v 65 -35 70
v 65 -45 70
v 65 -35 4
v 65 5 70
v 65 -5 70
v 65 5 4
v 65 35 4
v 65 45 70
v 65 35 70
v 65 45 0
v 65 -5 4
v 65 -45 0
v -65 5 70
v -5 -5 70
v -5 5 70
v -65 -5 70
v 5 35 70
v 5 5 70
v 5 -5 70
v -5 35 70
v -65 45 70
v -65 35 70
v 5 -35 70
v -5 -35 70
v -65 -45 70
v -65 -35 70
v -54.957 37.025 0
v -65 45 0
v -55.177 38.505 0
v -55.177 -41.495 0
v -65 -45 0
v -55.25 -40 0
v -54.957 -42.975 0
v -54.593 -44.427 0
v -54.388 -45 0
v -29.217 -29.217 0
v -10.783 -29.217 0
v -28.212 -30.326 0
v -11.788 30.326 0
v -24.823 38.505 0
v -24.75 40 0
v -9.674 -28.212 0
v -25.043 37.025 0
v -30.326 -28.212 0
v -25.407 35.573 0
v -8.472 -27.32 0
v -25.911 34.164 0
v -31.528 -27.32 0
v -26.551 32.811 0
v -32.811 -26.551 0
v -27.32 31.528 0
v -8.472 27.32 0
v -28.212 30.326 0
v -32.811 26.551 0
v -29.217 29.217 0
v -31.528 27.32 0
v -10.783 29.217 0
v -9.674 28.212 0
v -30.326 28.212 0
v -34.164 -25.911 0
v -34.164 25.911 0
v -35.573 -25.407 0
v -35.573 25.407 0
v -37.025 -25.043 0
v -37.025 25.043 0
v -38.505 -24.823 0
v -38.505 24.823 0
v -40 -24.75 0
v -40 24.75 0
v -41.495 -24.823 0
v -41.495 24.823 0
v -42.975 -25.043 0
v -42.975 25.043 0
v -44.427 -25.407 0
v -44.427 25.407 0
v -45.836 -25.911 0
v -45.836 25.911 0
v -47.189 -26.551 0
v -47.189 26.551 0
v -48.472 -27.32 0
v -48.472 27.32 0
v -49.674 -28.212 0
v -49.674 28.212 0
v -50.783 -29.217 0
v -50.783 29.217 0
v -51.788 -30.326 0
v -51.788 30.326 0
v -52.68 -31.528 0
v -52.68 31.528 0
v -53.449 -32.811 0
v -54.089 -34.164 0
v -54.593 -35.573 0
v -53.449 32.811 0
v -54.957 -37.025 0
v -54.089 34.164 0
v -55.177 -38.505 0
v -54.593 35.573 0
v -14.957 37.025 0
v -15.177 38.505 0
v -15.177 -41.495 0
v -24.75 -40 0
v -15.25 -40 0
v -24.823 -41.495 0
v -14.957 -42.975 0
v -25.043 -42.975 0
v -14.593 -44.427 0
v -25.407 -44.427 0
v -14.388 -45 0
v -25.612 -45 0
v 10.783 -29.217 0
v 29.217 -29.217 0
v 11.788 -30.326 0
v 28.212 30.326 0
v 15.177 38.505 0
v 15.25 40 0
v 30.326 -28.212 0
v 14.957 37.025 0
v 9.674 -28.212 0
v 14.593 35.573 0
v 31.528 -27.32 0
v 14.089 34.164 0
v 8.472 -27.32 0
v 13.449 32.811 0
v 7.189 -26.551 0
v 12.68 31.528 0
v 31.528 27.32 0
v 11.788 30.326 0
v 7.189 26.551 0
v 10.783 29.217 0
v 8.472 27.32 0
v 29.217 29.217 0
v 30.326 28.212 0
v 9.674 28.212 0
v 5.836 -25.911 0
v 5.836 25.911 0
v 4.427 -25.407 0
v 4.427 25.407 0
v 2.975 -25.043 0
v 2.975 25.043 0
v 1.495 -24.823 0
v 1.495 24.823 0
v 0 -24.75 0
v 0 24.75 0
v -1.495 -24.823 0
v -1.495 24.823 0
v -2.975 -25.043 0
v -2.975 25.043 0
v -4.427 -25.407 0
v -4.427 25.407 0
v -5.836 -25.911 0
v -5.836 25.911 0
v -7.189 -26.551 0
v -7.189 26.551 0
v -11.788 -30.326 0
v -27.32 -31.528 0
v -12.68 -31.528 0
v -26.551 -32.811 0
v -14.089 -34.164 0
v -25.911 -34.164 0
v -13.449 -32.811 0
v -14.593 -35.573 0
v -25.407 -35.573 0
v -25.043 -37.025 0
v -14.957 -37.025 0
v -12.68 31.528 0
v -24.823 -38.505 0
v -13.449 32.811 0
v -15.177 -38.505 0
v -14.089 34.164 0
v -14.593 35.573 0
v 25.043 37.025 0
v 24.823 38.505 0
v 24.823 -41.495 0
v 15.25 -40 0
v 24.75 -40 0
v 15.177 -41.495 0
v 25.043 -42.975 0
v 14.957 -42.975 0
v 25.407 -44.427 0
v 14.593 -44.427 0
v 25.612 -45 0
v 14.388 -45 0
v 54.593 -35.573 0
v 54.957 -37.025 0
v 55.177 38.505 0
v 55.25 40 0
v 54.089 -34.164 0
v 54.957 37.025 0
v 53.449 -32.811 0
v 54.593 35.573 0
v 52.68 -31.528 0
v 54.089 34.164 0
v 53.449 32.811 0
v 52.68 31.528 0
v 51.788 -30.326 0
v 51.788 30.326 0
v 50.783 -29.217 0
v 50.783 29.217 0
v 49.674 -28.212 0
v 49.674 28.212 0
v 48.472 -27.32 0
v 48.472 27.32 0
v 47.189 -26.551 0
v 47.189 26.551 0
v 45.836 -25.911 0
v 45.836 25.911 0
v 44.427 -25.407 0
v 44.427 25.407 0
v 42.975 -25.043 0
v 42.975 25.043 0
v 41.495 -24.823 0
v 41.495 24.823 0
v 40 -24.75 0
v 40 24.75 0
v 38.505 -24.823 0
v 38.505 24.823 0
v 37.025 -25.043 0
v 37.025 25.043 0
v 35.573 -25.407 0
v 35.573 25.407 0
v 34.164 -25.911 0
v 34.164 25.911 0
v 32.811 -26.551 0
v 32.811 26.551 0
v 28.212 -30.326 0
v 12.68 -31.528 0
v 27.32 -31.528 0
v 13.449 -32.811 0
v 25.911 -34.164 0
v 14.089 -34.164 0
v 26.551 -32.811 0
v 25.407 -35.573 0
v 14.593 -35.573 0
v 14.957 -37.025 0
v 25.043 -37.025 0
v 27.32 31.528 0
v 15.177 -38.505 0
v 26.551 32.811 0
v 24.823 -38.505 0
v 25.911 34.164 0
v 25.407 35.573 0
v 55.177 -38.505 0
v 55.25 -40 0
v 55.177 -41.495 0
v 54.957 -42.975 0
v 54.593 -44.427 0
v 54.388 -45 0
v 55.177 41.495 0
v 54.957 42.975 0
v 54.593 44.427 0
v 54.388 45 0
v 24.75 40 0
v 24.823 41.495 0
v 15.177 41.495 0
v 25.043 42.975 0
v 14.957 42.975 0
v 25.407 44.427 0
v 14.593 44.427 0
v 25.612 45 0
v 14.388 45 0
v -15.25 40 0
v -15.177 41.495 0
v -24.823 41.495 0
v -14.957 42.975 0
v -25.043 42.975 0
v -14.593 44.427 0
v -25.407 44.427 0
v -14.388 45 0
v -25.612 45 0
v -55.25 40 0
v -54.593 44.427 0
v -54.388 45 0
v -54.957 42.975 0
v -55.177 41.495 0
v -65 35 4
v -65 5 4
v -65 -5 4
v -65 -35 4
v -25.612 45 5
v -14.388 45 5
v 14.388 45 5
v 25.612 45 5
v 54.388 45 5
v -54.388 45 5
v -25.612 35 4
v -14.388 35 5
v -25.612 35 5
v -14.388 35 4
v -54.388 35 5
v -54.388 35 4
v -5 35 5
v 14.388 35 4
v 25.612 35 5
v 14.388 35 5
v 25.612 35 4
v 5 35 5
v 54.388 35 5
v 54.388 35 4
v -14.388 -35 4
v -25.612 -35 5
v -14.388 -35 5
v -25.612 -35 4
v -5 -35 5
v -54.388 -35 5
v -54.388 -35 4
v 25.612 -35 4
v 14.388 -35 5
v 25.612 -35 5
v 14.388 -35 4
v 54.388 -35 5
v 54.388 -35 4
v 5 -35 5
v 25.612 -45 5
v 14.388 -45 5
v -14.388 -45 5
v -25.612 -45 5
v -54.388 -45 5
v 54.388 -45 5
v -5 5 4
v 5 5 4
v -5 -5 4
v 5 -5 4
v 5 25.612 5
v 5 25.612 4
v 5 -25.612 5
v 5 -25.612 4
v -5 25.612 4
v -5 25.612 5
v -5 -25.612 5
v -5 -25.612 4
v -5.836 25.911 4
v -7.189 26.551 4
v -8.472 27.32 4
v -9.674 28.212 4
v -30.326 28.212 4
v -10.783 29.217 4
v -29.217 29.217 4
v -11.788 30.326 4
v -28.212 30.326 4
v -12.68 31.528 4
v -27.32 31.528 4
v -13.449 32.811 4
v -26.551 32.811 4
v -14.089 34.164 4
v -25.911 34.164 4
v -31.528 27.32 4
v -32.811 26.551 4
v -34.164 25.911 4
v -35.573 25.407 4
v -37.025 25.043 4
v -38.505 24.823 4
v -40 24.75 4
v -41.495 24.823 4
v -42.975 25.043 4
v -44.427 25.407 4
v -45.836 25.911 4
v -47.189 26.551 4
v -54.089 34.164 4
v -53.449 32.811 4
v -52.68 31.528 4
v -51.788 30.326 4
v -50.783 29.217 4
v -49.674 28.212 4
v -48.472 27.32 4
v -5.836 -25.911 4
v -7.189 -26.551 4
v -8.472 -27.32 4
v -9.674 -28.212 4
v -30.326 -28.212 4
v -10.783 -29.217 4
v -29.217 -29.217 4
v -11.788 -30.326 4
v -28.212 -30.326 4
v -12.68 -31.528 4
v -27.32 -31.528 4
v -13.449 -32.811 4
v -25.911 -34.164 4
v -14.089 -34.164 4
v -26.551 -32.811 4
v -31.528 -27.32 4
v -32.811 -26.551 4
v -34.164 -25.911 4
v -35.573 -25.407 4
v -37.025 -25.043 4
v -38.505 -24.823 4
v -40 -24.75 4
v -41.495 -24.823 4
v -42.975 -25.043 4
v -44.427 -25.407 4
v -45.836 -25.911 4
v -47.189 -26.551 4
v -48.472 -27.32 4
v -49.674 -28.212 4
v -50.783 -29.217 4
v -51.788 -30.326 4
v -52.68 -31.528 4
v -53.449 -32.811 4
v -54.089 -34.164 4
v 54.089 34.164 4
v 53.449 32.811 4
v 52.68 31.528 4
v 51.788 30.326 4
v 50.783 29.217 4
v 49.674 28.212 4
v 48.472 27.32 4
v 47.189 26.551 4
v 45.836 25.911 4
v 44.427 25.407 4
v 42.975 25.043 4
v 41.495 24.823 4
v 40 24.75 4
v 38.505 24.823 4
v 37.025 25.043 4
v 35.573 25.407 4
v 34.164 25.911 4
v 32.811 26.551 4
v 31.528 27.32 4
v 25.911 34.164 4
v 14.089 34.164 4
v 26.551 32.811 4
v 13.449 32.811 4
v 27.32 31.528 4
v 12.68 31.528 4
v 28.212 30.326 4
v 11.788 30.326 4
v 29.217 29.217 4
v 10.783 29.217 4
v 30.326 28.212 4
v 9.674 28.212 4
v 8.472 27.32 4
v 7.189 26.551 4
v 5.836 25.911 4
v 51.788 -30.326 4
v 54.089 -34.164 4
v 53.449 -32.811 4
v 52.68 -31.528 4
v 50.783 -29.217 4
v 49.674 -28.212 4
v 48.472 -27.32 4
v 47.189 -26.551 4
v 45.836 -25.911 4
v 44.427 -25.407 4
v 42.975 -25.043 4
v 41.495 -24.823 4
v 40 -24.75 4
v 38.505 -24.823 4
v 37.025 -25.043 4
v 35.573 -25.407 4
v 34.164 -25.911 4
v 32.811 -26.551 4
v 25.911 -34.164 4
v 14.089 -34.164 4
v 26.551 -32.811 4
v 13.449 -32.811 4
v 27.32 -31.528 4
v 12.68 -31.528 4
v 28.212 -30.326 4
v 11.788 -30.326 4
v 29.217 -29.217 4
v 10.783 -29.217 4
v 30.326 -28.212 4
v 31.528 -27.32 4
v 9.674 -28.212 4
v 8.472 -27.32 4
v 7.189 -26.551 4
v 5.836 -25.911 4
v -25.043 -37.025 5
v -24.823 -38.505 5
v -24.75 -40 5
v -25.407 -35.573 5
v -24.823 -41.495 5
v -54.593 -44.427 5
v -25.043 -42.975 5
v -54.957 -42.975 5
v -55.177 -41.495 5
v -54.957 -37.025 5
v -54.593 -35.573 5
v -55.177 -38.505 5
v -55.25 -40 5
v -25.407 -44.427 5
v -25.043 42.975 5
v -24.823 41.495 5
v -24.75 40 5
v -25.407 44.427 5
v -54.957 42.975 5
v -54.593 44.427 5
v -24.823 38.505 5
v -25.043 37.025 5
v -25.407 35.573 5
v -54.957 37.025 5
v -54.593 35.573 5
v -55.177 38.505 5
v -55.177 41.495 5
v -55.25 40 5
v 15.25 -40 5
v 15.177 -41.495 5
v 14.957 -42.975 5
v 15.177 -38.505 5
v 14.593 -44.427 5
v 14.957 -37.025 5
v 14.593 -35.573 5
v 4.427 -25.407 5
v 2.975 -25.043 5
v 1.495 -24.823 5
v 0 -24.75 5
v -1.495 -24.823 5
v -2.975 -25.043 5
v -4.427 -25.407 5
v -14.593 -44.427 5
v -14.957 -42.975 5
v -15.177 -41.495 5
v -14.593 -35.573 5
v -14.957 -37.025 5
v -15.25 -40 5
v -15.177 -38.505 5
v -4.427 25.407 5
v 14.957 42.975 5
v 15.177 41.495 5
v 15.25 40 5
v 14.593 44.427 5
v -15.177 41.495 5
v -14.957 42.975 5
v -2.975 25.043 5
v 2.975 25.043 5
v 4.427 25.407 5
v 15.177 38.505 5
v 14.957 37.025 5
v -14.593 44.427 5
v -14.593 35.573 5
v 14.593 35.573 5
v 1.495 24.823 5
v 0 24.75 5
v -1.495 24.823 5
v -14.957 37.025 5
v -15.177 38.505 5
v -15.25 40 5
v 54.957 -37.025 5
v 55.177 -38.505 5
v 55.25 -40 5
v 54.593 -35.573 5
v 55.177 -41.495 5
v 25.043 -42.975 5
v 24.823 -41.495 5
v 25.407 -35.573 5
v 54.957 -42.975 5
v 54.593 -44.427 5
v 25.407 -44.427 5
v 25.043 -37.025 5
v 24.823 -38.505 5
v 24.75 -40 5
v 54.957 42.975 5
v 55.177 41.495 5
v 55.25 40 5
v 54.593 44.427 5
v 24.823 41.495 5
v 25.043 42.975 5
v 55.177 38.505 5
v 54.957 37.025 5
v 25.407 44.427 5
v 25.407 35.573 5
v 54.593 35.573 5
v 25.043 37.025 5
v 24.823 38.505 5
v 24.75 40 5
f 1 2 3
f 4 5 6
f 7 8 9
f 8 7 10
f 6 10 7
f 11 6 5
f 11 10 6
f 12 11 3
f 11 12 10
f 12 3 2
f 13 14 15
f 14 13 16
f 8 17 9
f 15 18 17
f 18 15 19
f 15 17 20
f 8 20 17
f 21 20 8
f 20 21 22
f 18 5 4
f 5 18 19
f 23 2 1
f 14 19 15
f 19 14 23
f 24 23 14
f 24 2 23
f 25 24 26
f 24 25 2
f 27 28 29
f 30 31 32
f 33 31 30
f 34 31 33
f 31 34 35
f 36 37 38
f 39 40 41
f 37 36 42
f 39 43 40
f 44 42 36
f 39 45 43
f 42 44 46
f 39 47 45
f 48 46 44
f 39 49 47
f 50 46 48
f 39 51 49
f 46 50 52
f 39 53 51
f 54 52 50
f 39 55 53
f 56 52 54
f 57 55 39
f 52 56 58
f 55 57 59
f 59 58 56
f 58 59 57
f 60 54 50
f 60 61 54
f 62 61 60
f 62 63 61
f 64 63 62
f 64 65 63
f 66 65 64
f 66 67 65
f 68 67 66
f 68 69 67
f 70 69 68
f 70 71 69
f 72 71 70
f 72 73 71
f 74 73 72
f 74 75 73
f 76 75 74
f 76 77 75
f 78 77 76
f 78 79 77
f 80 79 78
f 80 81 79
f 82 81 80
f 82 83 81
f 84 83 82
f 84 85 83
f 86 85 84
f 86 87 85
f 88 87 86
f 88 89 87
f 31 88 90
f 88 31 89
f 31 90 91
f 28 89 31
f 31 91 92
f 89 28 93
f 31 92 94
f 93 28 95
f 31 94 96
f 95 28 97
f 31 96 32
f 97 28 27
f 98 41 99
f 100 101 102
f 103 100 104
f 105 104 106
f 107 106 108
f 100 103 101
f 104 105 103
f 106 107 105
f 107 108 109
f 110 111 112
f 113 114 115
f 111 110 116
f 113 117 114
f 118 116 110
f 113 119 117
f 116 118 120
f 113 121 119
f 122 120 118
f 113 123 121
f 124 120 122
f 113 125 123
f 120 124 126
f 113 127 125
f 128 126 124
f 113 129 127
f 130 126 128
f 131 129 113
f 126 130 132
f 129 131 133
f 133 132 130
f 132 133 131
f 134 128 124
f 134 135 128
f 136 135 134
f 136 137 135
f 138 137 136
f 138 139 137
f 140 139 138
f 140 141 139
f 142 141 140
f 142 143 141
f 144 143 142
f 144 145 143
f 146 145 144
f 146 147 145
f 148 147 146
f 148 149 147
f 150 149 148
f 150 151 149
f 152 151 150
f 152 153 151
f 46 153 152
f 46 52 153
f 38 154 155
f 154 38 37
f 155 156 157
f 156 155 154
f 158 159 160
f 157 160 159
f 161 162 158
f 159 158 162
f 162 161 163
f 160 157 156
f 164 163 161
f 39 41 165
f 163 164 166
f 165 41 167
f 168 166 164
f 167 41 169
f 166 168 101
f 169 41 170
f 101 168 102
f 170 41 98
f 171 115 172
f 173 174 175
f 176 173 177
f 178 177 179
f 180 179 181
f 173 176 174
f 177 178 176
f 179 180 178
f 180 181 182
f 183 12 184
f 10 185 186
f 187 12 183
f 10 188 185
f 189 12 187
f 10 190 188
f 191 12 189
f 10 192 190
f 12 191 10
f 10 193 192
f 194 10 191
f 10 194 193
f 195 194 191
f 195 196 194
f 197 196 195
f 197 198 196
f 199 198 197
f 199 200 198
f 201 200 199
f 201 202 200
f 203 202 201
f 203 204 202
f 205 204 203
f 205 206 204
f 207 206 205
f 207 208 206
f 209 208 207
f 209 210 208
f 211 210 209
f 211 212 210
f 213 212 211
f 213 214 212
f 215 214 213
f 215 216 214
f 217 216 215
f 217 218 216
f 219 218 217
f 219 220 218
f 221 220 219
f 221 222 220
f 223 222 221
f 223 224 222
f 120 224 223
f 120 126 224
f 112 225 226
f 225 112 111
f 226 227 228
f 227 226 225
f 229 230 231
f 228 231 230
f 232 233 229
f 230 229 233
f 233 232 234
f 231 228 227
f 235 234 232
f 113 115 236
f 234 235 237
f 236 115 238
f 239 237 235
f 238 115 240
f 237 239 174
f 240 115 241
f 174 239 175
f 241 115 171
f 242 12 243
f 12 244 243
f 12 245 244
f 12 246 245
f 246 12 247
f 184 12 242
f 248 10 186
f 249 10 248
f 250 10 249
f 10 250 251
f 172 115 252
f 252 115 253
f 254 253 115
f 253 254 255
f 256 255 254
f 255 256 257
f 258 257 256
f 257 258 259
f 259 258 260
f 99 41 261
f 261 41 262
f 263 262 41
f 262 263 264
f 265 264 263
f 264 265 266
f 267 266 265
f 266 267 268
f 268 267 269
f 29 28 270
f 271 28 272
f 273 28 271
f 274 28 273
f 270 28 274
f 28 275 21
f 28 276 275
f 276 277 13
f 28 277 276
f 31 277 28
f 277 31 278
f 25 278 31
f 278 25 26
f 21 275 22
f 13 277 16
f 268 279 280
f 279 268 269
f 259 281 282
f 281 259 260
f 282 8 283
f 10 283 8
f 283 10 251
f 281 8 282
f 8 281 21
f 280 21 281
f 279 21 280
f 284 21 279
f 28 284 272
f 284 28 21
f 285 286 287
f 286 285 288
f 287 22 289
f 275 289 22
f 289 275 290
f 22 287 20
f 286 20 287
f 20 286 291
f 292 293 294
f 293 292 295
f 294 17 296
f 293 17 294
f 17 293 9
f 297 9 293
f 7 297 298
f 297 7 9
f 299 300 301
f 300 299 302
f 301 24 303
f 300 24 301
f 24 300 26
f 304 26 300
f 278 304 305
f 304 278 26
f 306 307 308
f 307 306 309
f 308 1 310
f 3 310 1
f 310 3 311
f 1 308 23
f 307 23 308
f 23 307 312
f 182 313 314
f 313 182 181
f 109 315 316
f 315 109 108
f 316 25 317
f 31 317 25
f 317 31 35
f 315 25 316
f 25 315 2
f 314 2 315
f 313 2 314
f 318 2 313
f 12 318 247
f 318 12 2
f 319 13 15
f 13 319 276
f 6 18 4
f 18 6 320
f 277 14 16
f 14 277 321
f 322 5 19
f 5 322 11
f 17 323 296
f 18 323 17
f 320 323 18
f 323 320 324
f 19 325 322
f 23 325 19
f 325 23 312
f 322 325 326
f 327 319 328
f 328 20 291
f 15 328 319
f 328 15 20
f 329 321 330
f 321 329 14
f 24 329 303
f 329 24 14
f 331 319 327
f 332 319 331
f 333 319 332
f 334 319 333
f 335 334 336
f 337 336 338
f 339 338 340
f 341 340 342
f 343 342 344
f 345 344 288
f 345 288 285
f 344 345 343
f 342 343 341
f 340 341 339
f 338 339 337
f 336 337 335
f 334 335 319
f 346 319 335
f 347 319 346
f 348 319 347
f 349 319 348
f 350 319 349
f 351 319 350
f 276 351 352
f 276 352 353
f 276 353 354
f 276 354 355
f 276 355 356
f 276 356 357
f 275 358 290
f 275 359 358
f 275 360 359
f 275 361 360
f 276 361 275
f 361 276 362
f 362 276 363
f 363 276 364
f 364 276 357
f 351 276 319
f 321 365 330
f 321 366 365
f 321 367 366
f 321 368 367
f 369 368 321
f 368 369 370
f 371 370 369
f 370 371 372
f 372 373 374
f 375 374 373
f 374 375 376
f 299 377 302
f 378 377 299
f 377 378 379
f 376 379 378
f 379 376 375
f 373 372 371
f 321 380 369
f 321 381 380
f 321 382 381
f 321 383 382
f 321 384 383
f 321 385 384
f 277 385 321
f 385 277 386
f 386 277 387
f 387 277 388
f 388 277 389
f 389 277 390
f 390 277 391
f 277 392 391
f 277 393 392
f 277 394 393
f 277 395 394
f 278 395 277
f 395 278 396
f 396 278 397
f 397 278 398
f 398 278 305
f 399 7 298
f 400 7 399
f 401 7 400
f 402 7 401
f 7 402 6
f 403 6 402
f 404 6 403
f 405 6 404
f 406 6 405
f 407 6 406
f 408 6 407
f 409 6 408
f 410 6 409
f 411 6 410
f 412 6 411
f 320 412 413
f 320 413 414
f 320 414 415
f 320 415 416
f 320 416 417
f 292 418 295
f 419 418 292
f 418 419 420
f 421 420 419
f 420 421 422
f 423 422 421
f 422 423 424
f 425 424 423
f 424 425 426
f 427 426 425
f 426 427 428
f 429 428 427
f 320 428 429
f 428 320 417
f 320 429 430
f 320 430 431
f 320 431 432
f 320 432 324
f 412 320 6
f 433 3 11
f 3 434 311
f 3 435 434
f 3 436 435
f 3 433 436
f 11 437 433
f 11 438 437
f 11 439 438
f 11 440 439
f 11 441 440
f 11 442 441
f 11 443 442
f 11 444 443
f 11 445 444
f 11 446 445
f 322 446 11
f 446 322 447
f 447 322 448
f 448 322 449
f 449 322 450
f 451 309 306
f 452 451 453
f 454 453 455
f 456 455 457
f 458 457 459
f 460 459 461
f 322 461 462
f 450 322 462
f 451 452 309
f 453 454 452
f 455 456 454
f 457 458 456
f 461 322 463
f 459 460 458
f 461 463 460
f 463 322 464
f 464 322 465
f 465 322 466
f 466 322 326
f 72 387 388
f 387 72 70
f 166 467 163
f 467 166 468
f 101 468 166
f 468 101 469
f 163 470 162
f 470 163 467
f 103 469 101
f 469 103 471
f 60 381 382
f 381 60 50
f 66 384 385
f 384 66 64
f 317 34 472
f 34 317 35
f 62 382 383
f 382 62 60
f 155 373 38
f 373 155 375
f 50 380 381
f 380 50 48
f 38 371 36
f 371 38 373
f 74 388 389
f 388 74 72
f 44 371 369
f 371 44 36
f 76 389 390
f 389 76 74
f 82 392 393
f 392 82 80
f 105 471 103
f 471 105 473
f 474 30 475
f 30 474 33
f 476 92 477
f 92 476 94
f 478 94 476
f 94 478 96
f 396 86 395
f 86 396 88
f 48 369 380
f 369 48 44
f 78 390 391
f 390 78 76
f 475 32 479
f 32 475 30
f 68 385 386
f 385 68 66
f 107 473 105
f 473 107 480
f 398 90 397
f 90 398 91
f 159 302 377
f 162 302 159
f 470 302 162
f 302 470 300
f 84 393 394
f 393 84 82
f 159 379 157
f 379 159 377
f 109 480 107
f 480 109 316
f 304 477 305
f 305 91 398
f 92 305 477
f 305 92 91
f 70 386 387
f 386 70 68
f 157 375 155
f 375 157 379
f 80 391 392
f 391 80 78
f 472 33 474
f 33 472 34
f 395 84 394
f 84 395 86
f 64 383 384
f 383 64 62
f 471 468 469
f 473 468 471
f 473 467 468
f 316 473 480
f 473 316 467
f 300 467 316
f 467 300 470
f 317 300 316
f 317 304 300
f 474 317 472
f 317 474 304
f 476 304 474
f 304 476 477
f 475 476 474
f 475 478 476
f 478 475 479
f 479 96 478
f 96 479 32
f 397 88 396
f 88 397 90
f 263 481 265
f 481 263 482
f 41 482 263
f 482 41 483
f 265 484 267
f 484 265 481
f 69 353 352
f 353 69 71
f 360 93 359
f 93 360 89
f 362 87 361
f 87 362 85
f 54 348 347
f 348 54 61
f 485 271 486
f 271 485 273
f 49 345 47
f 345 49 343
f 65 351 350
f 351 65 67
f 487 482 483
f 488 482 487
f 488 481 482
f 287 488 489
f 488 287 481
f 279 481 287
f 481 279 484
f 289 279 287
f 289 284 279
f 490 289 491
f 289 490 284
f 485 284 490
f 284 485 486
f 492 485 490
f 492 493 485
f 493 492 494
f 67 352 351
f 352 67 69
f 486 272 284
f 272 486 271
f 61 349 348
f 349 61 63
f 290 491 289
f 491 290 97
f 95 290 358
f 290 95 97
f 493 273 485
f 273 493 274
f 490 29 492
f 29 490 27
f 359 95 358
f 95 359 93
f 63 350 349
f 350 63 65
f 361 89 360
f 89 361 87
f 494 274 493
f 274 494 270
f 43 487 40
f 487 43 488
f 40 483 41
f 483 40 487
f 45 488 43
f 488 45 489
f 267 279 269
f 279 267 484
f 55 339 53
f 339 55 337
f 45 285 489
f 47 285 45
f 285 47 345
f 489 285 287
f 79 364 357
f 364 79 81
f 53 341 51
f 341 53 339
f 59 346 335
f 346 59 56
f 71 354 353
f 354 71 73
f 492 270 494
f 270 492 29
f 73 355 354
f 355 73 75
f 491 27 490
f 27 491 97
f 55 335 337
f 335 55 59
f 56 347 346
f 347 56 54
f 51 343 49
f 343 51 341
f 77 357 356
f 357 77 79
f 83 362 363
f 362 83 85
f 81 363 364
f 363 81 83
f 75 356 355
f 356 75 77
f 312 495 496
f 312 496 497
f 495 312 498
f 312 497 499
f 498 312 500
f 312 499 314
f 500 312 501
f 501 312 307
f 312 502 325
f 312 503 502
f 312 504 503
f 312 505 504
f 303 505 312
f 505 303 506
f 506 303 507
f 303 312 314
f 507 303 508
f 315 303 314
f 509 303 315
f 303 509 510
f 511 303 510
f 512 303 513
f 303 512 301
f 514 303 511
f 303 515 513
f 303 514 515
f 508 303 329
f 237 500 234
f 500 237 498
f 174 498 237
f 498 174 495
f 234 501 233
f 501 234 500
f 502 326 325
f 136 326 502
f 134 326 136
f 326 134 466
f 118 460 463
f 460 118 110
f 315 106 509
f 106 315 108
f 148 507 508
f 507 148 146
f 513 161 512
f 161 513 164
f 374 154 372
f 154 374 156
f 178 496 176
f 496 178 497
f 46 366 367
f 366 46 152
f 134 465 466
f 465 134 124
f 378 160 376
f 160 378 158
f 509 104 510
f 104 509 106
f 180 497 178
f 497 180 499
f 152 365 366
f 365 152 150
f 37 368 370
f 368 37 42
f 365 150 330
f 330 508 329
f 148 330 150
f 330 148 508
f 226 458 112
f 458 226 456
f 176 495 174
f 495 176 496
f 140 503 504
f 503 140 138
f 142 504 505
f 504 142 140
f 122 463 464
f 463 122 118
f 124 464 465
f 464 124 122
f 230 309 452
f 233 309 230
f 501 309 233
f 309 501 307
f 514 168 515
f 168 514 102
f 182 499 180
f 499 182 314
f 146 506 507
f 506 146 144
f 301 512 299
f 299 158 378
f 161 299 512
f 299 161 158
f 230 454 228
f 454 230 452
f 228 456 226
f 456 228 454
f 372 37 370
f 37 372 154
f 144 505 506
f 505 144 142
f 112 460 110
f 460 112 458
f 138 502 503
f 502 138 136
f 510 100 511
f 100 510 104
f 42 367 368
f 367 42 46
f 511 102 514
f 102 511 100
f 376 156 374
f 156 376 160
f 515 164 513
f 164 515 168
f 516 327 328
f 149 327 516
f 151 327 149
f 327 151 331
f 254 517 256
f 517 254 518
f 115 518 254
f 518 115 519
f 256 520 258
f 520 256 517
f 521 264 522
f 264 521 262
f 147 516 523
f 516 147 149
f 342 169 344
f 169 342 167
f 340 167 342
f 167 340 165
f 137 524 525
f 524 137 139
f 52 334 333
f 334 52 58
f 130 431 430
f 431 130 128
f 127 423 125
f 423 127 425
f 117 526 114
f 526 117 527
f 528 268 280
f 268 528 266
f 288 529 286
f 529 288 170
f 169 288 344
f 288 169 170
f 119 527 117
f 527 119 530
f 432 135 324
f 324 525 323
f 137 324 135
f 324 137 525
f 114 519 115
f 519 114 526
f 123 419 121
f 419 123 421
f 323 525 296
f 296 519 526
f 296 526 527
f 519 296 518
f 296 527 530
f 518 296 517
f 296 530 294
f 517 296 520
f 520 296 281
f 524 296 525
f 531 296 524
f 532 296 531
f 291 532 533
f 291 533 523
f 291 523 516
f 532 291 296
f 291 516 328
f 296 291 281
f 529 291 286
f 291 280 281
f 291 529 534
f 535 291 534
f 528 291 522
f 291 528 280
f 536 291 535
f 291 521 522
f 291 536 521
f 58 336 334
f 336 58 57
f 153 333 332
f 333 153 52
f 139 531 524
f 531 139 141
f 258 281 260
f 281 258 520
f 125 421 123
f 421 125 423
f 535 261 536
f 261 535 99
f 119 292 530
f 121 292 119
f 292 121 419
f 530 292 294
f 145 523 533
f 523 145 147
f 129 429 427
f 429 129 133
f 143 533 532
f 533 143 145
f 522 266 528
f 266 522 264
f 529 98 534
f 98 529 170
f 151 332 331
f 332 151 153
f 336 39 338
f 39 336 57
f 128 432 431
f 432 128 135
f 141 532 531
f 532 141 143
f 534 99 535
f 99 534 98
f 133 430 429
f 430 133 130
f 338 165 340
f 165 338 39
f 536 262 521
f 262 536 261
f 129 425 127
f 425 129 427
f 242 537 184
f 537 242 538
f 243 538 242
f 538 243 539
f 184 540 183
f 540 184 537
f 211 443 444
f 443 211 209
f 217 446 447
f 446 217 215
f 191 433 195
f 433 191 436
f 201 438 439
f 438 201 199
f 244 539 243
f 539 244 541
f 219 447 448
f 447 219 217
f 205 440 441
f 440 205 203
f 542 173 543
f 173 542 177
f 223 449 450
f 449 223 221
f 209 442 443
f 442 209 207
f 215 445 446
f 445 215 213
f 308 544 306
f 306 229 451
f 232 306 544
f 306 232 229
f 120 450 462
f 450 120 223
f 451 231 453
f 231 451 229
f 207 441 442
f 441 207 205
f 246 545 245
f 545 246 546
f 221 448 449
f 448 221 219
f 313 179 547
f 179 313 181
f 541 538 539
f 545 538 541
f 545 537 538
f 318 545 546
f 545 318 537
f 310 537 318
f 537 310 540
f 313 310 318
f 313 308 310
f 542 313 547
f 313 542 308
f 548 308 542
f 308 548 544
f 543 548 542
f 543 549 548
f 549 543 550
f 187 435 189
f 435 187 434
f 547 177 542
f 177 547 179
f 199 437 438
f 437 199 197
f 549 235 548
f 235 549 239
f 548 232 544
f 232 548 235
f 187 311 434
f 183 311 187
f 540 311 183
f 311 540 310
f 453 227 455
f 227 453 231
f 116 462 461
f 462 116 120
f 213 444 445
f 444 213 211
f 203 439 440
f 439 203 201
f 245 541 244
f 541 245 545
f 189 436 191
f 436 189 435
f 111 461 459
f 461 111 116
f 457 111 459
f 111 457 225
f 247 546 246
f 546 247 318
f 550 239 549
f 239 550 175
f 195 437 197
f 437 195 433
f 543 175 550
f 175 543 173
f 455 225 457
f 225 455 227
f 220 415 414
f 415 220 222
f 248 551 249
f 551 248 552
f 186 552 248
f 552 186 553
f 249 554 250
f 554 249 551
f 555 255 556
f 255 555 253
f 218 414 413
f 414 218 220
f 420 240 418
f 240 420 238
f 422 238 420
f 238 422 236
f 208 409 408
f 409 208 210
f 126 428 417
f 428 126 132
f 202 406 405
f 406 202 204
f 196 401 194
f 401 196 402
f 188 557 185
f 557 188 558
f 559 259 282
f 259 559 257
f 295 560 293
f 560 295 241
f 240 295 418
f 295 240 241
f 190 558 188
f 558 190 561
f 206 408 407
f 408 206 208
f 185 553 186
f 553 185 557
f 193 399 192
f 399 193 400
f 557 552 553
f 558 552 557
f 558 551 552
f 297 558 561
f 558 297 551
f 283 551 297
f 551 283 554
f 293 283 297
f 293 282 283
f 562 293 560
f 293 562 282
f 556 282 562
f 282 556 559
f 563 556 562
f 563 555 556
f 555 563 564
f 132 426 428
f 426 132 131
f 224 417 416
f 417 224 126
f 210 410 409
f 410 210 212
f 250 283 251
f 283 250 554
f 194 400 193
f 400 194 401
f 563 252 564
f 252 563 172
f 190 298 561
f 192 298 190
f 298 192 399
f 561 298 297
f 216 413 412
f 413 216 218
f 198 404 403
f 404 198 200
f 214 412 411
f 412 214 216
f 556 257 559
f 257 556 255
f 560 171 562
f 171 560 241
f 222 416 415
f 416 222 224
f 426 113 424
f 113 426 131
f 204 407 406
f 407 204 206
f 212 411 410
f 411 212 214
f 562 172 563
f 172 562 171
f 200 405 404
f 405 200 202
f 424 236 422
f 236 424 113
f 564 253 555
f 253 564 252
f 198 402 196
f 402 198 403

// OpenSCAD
// 50 mL conical tube rack – printed upside-down, then flipped.
// Print orientation: flat plate on the bed (z = 0..4), walls rising +Z.
// After flipping: rack stands on the two walls; tubes pass through the holes.

// ---- Plate ----
plate_x = 130;   // plate length along X (mm)
plate_y = 90;    // plate width  along Y (mm)
plate_t = 4;     // plate thickness (mm)

// ---- Tube holes ----
hole_d  = 30.5;  // through-hole diameter (mm)
hole_r  = hole_d / 2;
pitch   = 40;    // centre-to-centre spacing in both X and Y (mm)

// ---- Side walls (run along the two long edges, i.e. along X) ----
wall_len  = 130; // wall length along X (mm)
wall_thk  = 10;  // wall thickness along Y (mm) – thick enough to bridge the gap
wall_h    = 70;  // wall height above z = 0 (mm)

// ---- Internal cross-brace (spans the gap between the two walls so the
//      plate top is a flat, supported surface and needs no bridging) ----
brace_thk = 10;  // brace thickness (mm)

$fn = 64;

// ------------------------------------------------------------------
// Base plate, centred on the origin in X and Y, sitting on z = 0.
// ------------------------------------------------------------------
module plate() { translate([-plate_x/2, -plate_y/2, 0])
        cube([plate_x, plate_y, plate_t]); }

// ------------------------------------------------------------------
// Six through-holes: 2 rows (Y) x 3 columns (X), 40 mm pitch, centred.
// Cylinders extend 1 mm past each face of the 4 mm plate (z = -1..5)
// so no cut face is exactly coplanar with the plate faces.
// ------------------------------------------------------------------
module holes() { for (i = [-1, 0, 1], j = [-1, 1])
    translate([i * pitch, j * pitch, -1])
        cylinder(h = plate_t + 2, r = hole_r, $fn = $fn); }

// ------------------------------------------------------------------
// Two solid walls along the long edges, flush with the plate edges.
// Each wall: 130 (X) x 10 (Y) x 70 (Z), rising from z = 0 to z = 70.
// ------------------------------------------------------------------
module walls() { union()
    // wall on the +Y edge (flush with y = +plate_y/2)
    translate([-wall_len/2,  plate_y/2 - wall_thk, 0])
        cube([wall_len, wall_thk, wall_h]);
    // wall on the -Y edge (flush with y = -plate_y/2)
    translate([-wall_len/2, -plate_y/2, 0])
        cube([wall_len, wall_thk, wall_h]); }

// ------------------------------------------------------------------
// Internal cross-brace: a 10 mm-thick strip along X at the centre, plus
// a 10 mm-thick strip along Y, both rising from the plate to z = 70.
// The X strip spans the 70 mm gap between the walls, so the plate top
// is a flat, supported surface (no bridging / no supports needed).
// The Y strip is centred on the plate and clears the tube holes.
// ------------------------------------------------------------------
module brace() { union()
    translate([-wall_len/2, -brace_thk/2, 0])
        cube([wall_len, brace_thk, wall_h]);
    translate([-brace_thk/2, -plate_y/2, 0])
        cube([brace_thk, plate_y, wall_h]); }

// ------------------------------------------------------------------
// Final part: plate + walls + brace, with the six through-holes cut.
// ------------------------------------------------------------------
difference() {
    union() {
        plate();
        walls();
        brace();
    }
    holes();
}
